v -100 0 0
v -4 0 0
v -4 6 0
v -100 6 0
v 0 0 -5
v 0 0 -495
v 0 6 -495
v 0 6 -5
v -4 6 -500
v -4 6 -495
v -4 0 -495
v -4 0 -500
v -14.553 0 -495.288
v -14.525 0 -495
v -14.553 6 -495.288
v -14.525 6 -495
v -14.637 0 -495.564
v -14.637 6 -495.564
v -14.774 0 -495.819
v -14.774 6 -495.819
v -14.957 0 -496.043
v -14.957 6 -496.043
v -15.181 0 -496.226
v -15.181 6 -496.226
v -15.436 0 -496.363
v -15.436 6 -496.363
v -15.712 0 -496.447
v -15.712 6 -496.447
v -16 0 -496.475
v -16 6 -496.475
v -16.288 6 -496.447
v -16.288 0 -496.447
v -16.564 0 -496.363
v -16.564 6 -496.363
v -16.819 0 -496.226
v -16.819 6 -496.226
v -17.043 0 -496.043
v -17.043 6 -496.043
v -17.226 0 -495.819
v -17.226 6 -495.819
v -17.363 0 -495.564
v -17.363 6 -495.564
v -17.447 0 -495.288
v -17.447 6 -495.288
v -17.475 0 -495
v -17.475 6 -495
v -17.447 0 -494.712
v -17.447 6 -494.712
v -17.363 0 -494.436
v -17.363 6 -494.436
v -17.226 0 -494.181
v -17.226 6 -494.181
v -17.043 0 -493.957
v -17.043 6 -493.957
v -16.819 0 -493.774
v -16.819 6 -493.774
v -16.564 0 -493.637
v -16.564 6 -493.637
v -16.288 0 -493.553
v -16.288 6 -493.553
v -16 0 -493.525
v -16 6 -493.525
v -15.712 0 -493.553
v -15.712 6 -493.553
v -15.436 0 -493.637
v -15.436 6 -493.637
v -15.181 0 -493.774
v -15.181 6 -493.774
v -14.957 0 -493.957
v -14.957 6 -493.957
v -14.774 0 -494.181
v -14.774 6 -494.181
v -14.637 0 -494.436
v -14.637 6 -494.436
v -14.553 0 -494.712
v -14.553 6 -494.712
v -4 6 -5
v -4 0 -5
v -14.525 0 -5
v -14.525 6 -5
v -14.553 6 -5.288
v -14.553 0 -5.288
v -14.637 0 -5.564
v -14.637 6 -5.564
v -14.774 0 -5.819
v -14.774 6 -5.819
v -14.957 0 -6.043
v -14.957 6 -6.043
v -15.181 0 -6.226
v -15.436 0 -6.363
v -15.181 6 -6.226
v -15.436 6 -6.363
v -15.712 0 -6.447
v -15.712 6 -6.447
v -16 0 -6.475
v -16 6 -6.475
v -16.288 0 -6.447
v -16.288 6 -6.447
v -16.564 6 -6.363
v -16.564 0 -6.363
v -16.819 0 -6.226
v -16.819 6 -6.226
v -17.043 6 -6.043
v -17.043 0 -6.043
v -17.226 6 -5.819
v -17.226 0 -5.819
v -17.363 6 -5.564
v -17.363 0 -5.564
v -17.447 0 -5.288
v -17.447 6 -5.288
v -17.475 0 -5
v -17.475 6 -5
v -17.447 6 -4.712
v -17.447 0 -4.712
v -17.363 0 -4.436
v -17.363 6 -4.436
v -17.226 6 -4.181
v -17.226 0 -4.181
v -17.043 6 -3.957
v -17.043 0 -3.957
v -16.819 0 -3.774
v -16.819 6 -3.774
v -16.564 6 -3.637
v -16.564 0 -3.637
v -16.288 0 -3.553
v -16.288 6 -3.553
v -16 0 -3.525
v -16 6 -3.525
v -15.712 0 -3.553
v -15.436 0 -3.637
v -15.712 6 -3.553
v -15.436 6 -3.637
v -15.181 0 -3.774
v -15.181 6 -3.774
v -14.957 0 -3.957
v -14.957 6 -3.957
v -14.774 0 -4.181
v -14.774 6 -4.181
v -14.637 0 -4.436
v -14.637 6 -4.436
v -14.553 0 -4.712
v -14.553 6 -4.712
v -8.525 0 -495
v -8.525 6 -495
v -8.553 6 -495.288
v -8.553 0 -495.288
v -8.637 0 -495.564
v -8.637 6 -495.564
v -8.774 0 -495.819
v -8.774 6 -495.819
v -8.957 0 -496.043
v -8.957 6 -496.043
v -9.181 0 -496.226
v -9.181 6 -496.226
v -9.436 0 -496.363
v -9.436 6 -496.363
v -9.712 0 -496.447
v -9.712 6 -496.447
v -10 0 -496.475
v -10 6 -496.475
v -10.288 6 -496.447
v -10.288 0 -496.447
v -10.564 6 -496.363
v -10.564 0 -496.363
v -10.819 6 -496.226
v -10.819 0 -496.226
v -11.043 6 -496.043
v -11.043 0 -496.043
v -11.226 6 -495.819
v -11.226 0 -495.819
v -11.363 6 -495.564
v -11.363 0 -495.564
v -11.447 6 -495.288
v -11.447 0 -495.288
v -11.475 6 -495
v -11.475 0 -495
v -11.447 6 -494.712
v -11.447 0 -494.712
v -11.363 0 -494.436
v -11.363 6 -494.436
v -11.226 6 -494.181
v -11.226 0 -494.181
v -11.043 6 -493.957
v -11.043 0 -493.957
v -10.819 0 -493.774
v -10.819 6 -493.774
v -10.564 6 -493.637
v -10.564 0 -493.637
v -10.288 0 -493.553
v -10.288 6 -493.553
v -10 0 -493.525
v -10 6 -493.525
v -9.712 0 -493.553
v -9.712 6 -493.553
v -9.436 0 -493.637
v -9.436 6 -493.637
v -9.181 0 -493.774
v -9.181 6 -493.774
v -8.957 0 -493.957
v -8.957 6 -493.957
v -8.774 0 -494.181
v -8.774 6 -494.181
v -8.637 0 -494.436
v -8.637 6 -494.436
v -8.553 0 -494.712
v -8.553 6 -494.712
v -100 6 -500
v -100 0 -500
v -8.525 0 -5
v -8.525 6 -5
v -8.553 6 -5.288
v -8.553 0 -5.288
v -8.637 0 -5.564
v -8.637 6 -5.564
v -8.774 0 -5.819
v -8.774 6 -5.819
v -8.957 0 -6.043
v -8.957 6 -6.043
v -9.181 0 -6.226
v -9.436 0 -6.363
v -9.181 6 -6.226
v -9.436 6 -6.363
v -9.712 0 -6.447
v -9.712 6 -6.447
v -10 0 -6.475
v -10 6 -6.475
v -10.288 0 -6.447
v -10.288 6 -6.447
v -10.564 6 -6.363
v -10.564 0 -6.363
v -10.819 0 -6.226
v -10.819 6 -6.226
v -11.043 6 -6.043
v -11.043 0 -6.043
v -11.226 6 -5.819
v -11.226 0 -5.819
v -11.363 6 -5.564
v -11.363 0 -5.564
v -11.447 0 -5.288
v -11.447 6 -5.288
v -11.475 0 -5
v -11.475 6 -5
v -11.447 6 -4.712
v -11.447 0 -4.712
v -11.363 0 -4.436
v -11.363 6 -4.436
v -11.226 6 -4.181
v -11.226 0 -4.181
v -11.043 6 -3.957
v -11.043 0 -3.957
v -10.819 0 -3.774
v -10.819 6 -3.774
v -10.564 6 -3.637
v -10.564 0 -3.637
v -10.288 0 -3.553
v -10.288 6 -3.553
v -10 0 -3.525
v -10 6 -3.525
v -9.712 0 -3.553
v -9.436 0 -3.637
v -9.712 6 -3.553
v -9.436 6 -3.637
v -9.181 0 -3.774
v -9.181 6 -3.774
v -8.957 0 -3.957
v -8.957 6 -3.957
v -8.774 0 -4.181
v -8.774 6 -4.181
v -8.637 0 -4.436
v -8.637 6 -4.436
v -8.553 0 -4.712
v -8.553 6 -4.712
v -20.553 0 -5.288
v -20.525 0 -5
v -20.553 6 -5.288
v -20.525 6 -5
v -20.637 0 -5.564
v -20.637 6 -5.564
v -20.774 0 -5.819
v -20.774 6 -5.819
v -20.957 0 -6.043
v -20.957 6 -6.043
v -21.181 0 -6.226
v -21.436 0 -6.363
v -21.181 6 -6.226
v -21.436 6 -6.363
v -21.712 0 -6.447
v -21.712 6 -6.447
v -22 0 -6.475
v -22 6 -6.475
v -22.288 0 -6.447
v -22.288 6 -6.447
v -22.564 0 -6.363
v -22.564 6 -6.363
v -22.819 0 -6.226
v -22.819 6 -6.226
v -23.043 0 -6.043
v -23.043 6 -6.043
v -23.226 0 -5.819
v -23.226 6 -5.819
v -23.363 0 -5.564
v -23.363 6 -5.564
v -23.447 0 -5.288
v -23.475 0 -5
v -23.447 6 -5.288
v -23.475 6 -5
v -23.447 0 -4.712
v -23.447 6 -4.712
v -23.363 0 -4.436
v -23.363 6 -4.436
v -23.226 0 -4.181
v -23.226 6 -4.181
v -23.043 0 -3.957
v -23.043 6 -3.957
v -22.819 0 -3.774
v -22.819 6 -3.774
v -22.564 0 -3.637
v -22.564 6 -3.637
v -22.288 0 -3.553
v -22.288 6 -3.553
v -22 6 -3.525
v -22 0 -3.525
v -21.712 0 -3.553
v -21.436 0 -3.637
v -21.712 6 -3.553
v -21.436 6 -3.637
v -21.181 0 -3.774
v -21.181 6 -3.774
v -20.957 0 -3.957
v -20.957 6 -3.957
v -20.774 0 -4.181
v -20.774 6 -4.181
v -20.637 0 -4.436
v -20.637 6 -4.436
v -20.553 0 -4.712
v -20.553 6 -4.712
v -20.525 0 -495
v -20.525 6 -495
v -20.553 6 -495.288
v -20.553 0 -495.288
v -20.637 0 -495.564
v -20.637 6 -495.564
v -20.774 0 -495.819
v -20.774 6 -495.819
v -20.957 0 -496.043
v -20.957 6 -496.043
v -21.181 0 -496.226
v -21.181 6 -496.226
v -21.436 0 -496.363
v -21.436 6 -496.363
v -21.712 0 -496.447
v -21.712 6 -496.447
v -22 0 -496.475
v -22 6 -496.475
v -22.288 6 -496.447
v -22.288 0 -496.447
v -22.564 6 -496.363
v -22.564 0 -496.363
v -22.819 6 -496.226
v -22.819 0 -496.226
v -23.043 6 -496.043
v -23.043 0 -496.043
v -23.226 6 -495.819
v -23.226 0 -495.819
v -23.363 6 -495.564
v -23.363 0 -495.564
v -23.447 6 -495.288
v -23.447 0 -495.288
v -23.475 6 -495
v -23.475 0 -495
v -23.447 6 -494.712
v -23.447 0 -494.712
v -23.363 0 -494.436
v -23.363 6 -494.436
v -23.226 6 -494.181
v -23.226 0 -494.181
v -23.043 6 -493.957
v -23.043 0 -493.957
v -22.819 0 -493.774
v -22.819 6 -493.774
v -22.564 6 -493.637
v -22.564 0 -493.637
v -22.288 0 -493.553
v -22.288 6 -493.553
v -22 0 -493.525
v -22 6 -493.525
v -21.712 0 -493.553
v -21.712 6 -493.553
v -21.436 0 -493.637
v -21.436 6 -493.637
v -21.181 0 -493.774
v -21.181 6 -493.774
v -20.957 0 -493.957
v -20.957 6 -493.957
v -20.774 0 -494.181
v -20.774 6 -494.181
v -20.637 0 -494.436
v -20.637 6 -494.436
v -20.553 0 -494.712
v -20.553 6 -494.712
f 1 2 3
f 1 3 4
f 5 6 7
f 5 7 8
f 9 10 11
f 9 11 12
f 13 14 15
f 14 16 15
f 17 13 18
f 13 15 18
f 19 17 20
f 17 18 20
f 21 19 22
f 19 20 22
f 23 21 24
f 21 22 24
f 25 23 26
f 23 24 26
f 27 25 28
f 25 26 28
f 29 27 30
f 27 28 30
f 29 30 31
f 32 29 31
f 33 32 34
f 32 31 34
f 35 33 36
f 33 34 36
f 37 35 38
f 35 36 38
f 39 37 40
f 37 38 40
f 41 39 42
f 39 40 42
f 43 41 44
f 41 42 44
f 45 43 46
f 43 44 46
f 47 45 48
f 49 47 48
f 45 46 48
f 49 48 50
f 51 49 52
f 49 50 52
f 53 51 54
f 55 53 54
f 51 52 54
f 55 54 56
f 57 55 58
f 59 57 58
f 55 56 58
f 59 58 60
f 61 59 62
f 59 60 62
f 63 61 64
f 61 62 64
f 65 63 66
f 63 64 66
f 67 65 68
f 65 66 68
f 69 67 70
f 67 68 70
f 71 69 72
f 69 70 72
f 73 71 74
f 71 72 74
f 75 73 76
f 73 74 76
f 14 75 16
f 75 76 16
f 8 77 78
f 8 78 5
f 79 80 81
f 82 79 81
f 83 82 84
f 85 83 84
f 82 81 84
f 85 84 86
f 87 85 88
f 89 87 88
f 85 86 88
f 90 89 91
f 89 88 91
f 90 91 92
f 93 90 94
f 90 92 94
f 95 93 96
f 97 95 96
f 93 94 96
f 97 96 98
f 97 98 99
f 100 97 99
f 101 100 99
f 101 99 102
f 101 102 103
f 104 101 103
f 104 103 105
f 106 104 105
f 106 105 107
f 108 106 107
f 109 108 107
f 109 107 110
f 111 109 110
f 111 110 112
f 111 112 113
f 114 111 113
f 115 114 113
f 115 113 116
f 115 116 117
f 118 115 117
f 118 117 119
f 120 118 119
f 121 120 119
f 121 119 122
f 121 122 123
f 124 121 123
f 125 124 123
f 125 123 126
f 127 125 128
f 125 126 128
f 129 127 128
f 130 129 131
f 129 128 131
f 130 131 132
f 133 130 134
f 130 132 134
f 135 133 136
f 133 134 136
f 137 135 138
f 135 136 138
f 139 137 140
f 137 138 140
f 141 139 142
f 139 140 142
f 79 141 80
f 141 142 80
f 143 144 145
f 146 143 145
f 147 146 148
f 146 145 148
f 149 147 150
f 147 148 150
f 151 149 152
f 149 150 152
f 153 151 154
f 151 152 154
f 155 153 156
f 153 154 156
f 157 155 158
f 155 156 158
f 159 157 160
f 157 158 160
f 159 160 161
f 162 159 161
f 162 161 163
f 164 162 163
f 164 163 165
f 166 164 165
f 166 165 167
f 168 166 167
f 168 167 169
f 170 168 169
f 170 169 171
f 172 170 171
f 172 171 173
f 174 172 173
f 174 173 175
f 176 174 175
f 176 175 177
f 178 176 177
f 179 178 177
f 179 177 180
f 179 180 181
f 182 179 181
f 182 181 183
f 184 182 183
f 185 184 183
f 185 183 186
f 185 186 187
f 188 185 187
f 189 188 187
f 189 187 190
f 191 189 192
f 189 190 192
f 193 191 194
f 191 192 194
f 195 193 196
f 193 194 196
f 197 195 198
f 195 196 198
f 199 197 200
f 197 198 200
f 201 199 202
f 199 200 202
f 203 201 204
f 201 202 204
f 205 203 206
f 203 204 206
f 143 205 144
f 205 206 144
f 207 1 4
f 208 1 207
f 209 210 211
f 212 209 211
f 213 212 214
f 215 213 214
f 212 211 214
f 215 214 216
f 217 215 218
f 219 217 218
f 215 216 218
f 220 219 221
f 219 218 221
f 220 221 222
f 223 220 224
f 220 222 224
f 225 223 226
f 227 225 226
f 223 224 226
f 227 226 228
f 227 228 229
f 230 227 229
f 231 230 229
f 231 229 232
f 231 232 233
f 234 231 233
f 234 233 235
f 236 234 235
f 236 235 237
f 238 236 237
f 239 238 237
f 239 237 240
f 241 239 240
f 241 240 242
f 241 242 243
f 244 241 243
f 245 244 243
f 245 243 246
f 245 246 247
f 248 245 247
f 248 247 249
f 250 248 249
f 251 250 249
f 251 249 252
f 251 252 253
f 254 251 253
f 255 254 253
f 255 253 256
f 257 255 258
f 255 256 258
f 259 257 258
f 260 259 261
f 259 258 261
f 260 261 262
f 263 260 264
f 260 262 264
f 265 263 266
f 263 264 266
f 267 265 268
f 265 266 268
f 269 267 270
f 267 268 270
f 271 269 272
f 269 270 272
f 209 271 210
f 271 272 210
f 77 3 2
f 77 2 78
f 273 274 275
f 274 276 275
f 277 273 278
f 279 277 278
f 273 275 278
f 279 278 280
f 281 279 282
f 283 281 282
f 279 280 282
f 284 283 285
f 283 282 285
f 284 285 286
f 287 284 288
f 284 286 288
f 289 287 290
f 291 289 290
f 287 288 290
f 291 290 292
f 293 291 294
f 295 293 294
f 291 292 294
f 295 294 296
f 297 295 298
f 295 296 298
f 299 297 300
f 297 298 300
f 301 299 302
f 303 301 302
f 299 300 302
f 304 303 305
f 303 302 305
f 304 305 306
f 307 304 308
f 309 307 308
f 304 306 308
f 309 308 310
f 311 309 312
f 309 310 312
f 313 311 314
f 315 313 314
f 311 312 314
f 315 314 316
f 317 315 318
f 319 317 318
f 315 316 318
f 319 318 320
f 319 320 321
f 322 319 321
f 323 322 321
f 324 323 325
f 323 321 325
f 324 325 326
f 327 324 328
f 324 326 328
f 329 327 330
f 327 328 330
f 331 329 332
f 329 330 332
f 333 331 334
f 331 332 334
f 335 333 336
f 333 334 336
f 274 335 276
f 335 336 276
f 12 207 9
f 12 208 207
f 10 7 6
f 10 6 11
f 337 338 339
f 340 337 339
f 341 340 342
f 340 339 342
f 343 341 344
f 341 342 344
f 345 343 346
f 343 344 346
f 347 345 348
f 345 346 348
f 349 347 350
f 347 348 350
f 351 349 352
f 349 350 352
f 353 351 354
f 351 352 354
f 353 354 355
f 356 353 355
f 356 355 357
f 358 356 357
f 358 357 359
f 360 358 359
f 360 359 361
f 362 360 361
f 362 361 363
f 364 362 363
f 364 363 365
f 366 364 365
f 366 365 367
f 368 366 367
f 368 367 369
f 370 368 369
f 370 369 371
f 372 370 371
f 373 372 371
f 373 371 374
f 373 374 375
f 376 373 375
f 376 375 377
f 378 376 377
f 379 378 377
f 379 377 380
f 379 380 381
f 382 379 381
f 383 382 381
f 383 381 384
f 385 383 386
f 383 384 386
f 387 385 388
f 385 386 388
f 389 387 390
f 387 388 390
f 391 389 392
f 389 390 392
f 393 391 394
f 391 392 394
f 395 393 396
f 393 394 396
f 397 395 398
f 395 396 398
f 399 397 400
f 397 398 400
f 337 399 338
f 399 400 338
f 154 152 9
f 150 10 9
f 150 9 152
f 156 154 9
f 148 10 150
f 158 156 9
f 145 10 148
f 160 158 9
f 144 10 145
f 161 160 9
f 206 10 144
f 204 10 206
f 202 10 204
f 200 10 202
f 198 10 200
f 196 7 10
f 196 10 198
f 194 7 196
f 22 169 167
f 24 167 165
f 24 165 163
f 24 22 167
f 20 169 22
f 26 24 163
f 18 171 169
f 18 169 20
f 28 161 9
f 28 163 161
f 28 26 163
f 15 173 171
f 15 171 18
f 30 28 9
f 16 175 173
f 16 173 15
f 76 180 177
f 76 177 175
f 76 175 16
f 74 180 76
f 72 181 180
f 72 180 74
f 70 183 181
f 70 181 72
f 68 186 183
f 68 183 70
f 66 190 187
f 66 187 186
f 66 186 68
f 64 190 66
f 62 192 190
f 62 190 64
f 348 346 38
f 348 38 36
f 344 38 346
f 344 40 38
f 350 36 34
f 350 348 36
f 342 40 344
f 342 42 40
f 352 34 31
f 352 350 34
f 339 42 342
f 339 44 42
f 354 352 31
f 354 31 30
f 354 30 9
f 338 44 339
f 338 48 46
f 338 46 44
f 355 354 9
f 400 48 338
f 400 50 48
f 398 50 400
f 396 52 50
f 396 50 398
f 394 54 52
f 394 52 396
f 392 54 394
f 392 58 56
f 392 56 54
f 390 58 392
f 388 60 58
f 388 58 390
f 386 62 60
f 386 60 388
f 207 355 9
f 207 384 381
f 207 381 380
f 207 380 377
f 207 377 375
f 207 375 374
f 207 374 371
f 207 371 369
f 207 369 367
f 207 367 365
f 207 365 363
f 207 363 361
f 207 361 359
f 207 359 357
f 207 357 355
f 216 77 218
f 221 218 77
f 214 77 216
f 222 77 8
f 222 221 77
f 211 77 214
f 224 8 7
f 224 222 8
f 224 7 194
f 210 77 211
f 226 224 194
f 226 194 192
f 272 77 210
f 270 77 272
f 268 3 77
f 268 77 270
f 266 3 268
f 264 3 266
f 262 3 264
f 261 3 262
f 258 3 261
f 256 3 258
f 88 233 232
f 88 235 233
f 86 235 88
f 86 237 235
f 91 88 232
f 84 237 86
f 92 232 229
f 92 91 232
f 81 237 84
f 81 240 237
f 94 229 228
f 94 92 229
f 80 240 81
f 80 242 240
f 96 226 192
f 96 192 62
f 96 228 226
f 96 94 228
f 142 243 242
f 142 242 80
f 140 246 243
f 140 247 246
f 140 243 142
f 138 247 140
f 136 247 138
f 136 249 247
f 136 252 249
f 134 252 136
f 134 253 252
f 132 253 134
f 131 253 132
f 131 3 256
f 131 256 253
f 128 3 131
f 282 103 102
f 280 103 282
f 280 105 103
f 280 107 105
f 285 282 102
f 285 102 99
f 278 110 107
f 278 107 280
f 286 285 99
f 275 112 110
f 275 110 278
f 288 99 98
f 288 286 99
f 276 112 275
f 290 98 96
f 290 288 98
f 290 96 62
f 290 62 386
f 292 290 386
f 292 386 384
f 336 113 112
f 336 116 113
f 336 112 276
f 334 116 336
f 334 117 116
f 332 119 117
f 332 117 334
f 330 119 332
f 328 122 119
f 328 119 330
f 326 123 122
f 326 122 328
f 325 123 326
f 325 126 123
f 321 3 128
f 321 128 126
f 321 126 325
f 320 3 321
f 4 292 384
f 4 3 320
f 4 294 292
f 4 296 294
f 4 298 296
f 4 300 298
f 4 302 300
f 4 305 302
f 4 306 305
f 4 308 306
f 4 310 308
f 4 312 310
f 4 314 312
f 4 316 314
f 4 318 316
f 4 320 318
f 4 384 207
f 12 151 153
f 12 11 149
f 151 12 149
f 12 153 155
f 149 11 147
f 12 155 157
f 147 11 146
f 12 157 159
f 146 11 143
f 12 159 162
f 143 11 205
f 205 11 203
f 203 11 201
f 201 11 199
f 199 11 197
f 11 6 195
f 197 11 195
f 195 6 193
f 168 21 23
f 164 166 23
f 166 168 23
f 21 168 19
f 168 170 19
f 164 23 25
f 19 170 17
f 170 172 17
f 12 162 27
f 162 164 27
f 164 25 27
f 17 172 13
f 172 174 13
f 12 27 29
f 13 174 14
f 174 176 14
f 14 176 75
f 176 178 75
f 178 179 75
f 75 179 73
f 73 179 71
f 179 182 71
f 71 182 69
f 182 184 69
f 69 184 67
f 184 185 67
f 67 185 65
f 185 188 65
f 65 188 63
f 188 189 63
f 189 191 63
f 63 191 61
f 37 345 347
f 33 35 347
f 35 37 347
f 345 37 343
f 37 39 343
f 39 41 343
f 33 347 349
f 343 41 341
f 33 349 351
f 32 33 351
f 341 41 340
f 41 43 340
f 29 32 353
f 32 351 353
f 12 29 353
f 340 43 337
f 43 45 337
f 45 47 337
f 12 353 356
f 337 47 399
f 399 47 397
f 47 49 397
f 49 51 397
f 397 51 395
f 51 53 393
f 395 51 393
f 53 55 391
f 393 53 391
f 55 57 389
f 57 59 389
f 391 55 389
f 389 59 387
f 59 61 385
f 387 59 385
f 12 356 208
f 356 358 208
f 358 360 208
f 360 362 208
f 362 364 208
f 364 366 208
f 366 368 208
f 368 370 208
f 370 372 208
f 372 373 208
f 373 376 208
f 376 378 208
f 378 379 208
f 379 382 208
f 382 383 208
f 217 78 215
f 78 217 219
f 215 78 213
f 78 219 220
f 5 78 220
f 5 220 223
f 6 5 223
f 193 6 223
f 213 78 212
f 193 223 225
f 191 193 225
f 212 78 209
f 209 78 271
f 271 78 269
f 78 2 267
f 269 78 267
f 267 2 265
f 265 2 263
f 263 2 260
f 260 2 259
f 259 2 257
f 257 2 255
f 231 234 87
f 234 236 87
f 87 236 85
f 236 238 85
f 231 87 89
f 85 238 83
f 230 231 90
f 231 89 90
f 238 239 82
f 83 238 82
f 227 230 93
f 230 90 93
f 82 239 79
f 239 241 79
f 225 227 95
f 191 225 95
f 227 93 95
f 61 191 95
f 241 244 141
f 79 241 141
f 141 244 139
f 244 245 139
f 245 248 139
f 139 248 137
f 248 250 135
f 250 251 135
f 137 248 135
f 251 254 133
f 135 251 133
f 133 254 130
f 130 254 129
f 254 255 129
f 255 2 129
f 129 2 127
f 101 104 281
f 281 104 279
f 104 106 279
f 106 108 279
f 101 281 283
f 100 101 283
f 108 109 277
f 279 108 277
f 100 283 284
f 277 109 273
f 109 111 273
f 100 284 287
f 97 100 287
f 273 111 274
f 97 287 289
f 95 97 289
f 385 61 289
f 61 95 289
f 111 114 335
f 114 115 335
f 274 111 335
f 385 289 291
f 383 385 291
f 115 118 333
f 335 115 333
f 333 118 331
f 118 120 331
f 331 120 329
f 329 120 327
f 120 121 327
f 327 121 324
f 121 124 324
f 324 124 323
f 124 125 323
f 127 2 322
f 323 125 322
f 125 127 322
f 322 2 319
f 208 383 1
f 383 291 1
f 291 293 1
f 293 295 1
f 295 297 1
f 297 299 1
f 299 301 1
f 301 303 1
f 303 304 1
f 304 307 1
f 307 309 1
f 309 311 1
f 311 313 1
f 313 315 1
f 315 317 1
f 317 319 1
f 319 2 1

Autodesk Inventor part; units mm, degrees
ref_plane "YZ Plane" through (0, 0, 0) normal (1, 0, 0) x (0, 1, 0)
ref_plane "XZ Plane" through (0, 0, 0) normal (0, 1, 0) x (-1, 0, 0)
sketch "Sketch1" plane through (0, 0, 0) normal (0, 1, 0) x (-1, 0, 0)
  line L0 (0, 0) -> (100, 0)
  line L1 (100, 0) -> (100, -500)
  line L2 (100, -500) -> (0, -500)
  line L3 (0, -500) -> (0, 0)
  dimension "d0" = 500
  dimension "d1" = 100
extrude "Extrusion1" add sketch "Sketch1" along normal blind 6
sketch "Sketch2" plane through (0, 6, 0) normal (0, 1, 0) x (1, 0, 0)
  circle A0 centre (-10, 5) radius 1.475
  line L0 (-100, 0) -> (0, 0) projected
  line L1 (0, 0) -> (0, 500) projected
  dimension "d4" = 2.95
  dimension "d5" = 5
  dimension "d6" = 10
extrude "Extrusion2" cut sketch "Sketch2" against normal blind 10
pattern_linear "Rectangular Pattern1" count 3 spacing 6 along (-1, 0, 0) of "Extrusion2"
ref_plane "Work Plane1" through (-100, 0, -250) normal (0, 0, 1) x (1, 0, 0)
sketch "Sketch3" plane through (0, 6, 0) normal (0, 1, 0) x (1, 0, 0)
  line L0 (-100, 0) -> (0, 0) projected
  line L1 (0, 0) -> (-4, 0)
  line L2 (-4, 0) -> (-4, 5)
  line L3 (-4, 5) -> (0, 5)
  line L4 (0, 5) -> (0, 0)
  dimension "d12" = 4
  dimension "d13" = 5
extrude "Extrusion3" cut sketch "Sketch3" against normal blind 100
mirror "Mirror1" about plane through (-100, 0, -250) normal (0, 0, 1) of "Extrusion2", "Rectangular Pattern1", "Extrusion3"
sketch "Sketch4" plane through (0, 6, 0) normal (0, 1, 0) x (1, 0, 0)
  circle A0 centre (-22, 5) radius 1.475 projected
  circle A1 centre (-16, 5) radius 1.475 projected
  circle A2 centre (-10, 5) radius 1.475 projected
  line L0 (0, 495) -> (-4, 495) projected
  line L1 (-4, 495) -> (-4, 500) projected
  line L2 (-4, 500) -> (-100, 500) projected
  line L3 (-100, 500) -> (-100, 0) projected
  line L4 (-100, 0) -> (-4, 0) projected
  line L5 (-4, 0) -> (-4, 5) projected
  line L6 (-4, 5) -> (0, 5) projected
  line L7 (0, 5) -> (0, 495) projected
  circle A3 centre (-10, 495) radius 1.475 projected
  circle A4 centre (-16, 495) radius 1.475 projected
  circle A5 centre (-22, 495) radius 1.475 projected
  point P0 (0, 0)
properties part number "Bending_plate"
